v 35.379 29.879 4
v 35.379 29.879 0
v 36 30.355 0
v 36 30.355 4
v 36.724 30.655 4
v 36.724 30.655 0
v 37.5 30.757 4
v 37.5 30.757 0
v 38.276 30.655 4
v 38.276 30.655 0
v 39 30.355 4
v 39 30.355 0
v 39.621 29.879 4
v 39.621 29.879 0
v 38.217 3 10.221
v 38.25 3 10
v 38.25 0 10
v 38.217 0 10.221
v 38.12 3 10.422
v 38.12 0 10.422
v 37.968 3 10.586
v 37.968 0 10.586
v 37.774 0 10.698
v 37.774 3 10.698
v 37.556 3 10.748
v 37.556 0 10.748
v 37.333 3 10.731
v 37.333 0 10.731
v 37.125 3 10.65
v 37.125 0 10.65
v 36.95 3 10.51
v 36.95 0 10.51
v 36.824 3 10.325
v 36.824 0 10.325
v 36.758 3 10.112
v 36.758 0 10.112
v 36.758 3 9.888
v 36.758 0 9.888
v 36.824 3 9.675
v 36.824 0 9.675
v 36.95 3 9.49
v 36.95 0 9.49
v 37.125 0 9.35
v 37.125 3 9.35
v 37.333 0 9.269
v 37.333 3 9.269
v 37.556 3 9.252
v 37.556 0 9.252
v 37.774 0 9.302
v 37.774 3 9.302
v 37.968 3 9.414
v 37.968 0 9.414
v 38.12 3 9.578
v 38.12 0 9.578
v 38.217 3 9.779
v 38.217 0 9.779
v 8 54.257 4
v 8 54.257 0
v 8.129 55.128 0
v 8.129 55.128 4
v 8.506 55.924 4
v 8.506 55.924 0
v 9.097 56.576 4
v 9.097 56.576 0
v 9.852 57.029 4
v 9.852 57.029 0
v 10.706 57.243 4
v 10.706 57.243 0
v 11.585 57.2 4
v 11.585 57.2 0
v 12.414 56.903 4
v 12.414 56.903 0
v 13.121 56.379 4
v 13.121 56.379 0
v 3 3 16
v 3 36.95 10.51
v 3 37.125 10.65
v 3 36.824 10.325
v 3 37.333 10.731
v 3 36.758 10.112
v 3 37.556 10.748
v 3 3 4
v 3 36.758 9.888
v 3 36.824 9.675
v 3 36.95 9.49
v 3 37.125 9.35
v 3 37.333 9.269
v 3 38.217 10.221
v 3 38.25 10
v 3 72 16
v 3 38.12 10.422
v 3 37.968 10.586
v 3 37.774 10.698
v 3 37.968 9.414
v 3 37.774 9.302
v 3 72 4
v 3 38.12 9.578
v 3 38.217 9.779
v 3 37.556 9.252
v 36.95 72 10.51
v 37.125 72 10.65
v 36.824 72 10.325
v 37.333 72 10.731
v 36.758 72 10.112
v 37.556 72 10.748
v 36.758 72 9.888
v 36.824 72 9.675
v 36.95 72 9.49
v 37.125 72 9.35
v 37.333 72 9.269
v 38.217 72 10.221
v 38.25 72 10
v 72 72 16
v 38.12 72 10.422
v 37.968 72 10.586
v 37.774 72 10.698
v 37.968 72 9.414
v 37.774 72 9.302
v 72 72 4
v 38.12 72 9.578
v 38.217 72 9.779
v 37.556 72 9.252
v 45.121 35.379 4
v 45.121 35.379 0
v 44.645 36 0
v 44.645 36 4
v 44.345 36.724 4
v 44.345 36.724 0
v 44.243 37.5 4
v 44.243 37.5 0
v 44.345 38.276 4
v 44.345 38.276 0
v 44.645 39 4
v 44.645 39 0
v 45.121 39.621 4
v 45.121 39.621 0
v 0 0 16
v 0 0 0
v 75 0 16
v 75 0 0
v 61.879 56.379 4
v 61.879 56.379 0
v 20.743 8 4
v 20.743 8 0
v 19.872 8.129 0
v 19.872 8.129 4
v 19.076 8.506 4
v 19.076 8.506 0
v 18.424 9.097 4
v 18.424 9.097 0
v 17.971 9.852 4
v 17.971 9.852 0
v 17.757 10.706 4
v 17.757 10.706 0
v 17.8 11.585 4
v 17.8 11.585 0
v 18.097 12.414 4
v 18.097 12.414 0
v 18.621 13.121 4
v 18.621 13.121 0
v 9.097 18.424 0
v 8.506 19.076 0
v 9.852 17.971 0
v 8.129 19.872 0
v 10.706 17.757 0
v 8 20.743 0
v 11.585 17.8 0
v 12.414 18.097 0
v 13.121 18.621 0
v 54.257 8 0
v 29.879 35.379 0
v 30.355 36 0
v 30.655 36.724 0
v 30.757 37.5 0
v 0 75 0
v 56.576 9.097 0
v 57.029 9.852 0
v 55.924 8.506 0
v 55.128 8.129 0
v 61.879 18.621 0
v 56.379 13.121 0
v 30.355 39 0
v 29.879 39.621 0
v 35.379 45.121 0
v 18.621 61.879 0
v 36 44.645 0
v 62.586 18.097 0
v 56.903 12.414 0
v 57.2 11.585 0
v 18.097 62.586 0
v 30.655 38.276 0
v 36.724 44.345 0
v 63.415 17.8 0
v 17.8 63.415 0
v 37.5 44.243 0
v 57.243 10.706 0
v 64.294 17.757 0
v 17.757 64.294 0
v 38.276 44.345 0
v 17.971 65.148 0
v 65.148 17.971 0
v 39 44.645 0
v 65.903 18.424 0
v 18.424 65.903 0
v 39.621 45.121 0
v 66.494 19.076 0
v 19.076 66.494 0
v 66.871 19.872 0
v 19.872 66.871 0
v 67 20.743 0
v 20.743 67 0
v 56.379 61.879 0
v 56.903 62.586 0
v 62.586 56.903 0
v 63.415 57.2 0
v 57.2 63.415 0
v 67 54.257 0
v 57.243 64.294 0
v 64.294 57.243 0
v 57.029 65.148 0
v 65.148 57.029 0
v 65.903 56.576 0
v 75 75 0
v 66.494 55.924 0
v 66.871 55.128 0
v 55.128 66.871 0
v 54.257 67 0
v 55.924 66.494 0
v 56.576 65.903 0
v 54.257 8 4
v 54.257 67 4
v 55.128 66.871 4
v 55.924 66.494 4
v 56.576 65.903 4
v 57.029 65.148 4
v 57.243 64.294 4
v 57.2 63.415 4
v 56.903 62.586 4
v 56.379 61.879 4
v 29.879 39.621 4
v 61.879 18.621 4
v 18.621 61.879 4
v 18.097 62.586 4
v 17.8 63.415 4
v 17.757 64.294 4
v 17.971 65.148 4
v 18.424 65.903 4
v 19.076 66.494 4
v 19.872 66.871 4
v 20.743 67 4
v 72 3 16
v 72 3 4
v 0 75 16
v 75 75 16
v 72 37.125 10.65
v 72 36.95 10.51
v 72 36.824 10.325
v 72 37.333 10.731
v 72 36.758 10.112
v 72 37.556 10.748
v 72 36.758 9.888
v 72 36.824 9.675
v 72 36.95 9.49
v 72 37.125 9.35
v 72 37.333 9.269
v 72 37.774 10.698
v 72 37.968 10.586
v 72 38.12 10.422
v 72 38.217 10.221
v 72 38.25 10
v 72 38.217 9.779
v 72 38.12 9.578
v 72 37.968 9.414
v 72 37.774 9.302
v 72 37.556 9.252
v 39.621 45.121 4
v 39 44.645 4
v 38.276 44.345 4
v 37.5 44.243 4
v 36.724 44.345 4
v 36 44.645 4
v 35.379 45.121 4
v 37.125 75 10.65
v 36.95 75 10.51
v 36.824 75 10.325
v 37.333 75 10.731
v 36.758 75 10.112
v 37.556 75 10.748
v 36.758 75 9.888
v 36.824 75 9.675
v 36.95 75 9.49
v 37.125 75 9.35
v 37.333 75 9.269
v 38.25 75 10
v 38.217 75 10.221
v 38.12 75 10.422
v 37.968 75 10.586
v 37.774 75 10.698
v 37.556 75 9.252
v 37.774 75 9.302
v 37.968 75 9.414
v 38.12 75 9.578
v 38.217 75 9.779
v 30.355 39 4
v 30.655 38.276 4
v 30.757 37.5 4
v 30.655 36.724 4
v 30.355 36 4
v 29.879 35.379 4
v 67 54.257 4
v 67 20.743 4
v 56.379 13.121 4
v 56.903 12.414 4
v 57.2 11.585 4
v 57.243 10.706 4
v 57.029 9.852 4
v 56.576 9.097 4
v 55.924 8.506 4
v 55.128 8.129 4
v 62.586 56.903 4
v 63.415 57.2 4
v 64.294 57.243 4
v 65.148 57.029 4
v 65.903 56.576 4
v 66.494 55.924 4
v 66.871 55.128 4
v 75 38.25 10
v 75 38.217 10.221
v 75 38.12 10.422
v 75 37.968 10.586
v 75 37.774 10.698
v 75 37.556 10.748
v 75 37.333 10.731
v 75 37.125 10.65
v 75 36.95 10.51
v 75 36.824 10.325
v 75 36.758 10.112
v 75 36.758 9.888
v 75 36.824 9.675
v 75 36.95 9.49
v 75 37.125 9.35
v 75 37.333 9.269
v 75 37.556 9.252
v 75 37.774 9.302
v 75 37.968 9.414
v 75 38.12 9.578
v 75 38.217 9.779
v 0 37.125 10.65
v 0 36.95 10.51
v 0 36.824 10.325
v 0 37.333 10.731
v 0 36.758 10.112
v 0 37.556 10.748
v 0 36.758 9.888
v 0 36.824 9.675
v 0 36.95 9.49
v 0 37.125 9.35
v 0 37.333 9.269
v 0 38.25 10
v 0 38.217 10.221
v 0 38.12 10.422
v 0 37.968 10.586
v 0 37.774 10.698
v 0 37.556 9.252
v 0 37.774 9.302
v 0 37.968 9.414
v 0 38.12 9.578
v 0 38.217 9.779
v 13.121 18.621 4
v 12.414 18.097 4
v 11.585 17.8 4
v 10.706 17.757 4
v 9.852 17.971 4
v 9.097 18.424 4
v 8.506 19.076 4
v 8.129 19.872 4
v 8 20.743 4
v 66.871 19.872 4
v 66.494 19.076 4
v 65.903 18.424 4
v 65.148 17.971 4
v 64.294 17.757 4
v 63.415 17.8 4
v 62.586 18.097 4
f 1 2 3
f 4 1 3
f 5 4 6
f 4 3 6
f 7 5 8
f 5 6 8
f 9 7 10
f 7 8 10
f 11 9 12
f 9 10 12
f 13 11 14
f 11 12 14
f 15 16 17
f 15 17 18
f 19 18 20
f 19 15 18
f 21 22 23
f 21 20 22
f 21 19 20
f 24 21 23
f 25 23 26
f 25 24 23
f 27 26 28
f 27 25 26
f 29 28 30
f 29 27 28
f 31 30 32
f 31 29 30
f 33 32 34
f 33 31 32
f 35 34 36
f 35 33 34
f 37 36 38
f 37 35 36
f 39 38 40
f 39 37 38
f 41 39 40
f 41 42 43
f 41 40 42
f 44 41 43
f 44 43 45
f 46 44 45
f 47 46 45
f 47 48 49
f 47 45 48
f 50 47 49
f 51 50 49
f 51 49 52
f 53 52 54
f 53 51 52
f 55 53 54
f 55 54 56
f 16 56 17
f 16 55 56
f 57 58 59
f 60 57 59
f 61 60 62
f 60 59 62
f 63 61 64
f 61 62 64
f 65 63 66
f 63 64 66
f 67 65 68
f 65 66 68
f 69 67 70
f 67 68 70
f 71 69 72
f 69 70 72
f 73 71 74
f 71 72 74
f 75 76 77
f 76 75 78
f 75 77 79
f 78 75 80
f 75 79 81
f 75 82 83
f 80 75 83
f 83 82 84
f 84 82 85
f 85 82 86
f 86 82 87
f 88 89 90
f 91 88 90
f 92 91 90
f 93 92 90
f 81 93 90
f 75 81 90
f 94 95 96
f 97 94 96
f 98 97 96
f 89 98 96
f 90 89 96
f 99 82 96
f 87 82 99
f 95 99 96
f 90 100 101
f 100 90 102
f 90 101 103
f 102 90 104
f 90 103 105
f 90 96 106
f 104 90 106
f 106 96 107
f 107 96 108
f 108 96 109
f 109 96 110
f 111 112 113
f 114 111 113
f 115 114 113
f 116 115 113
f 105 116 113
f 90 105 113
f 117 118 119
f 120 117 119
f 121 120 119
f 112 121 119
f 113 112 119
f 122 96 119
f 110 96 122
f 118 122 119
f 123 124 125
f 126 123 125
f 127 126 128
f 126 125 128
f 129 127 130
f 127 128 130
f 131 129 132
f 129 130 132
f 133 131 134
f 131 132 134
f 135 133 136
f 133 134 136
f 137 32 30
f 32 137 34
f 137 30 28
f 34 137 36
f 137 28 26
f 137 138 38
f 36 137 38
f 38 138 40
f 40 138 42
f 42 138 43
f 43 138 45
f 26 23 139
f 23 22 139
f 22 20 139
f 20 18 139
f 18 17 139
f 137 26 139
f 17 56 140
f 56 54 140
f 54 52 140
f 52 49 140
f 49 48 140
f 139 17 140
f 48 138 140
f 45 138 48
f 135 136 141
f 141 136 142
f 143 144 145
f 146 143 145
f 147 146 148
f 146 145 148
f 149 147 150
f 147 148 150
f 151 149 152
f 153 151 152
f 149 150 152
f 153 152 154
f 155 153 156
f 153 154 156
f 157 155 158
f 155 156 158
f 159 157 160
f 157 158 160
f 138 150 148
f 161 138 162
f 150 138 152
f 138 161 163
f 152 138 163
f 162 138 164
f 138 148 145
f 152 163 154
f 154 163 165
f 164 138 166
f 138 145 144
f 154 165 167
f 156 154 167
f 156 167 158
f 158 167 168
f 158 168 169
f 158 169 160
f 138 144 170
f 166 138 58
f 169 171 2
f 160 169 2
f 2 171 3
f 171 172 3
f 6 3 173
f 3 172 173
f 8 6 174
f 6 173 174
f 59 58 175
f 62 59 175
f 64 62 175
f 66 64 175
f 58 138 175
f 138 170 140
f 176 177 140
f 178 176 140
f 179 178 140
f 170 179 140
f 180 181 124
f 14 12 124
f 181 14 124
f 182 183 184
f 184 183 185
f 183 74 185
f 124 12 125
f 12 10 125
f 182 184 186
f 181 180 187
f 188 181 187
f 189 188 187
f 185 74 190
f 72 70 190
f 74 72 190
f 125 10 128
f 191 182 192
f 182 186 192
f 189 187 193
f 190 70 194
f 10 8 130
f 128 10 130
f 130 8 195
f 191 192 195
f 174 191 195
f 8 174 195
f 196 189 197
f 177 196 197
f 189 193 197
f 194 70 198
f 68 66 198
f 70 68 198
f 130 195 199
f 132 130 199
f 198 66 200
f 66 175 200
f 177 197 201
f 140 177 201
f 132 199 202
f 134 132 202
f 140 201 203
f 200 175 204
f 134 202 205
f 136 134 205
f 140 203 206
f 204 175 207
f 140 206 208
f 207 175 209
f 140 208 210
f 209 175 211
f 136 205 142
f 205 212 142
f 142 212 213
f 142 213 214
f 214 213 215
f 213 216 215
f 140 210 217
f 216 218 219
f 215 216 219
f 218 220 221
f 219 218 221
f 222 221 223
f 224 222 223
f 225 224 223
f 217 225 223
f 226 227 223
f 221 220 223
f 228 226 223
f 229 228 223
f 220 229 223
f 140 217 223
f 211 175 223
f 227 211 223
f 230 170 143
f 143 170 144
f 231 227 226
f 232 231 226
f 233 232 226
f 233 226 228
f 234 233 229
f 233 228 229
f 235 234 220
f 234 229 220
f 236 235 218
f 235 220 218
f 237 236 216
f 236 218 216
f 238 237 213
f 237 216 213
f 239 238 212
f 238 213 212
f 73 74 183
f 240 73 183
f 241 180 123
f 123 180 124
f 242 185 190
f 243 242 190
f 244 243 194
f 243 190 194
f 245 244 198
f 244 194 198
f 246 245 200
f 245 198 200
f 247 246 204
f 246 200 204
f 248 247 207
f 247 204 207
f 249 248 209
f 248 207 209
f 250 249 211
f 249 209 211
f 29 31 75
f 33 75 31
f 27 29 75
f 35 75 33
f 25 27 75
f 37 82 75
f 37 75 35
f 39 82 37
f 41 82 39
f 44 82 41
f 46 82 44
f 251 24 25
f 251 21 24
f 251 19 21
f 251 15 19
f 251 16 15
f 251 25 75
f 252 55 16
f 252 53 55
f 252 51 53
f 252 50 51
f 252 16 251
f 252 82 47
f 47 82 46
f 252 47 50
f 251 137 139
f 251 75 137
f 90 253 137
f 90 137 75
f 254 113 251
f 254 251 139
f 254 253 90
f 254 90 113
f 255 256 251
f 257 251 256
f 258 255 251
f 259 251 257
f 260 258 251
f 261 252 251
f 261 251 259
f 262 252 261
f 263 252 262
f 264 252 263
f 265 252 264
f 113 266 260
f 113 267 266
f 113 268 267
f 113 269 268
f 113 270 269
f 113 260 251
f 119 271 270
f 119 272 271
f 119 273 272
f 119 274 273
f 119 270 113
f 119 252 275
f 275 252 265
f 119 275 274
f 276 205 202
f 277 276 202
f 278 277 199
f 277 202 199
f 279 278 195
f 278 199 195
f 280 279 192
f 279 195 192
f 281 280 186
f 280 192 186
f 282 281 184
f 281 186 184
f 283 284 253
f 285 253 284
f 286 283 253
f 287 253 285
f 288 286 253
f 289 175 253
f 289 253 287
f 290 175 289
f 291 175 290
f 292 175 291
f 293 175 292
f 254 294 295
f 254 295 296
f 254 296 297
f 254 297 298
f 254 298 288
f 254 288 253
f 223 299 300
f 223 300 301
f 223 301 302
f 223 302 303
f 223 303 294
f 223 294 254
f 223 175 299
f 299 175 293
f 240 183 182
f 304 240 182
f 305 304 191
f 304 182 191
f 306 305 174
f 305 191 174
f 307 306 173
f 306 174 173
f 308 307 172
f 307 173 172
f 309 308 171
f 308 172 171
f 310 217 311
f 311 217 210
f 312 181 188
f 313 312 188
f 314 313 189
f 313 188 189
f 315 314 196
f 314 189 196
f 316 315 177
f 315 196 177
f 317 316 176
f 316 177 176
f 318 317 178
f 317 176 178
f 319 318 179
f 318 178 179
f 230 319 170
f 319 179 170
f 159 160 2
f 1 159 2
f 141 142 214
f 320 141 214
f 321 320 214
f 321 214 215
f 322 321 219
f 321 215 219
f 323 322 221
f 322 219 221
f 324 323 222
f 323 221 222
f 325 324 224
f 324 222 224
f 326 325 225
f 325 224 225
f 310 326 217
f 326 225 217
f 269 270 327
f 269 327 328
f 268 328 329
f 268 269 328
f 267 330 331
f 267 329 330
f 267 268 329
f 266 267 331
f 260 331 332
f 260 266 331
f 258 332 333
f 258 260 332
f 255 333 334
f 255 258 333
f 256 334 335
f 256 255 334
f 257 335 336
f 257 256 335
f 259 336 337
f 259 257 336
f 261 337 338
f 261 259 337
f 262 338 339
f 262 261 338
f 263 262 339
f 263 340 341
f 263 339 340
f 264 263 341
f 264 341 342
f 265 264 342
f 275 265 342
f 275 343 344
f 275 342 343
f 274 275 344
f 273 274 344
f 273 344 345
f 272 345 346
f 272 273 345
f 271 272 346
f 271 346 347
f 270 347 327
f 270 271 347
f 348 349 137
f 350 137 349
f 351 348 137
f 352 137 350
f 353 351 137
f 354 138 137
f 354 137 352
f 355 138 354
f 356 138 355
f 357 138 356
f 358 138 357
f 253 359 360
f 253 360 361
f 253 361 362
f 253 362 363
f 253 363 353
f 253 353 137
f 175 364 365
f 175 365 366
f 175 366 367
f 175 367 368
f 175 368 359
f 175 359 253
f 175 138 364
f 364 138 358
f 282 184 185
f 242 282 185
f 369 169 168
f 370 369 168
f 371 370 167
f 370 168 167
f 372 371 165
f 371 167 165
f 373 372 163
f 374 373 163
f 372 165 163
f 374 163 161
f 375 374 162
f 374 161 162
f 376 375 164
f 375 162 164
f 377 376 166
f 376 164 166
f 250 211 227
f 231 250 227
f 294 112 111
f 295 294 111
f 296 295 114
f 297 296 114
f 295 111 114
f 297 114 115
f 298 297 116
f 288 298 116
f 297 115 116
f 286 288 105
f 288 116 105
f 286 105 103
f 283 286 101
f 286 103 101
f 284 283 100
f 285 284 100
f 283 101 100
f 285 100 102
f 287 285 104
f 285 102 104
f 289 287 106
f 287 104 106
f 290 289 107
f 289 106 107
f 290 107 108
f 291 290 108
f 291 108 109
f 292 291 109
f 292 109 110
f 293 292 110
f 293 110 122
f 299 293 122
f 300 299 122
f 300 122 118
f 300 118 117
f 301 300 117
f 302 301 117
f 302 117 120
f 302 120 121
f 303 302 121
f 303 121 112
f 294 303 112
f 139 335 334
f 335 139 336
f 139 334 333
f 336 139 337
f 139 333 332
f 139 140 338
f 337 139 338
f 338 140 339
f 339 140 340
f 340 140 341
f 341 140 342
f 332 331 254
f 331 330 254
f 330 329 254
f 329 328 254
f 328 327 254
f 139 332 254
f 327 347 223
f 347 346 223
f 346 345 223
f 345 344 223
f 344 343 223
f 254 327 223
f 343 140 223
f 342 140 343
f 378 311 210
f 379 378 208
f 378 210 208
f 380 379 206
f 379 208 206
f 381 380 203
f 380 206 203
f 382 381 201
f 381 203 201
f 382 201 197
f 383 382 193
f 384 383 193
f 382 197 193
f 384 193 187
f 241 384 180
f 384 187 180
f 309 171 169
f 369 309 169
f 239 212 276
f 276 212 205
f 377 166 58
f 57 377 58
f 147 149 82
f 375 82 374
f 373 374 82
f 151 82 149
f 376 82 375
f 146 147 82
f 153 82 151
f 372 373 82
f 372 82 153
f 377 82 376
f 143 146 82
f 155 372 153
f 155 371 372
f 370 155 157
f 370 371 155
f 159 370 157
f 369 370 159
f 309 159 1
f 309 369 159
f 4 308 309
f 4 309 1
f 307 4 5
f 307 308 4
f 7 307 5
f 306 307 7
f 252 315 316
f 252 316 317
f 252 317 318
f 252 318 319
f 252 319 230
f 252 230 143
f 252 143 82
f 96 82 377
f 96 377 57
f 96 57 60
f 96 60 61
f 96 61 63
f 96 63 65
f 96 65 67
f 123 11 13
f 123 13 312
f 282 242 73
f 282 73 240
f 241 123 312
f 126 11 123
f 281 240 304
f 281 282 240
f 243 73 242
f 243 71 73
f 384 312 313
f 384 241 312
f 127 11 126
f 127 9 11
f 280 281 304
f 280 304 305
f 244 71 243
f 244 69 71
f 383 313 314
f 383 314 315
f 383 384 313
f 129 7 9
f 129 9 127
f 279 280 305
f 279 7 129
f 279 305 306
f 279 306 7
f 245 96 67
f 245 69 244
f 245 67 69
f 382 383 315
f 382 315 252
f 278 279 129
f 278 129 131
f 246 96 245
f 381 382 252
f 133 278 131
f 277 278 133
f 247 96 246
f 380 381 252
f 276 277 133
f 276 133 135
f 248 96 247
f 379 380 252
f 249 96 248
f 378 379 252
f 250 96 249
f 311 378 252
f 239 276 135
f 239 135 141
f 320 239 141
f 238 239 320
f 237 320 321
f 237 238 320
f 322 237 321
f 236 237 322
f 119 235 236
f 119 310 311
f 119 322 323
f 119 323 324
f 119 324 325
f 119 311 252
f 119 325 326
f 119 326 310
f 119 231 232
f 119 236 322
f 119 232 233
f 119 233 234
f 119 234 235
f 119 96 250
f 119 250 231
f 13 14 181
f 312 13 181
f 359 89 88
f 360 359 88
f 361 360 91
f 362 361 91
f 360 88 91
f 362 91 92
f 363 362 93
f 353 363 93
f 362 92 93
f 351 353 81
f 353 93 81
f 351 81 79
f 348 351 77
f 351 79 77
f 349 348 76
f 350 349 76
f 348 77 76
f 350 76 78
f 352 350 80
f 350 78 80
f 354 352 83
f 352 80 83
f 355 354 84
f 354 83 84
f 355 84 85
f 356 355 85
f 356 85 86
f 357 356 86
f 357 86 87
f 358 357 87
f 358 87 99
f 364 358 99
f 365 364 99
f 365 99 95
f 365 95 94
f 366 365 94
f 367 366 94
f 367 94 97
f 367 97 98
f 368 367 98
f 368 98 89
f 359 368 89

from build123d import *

# Parameters (mm, degrees)
F0_W          = 75
F0_H          = 75
F1_DEPTH      = 4
F2_W          = 75
F2_H          = 75
F2_W_2        = 69
F2_H_2        = 69
F3_DEPTH      = 12
F5_DEPTH      = 25
F6_R          = 0.75
F7_DEPTH      = 25
F7_DEPTH_BACK = 72.001
F8_R          = 0.75
F9_DEPTH      = 25
F9_DEPTH_BACK = 72.001


with BuildPart() as f1:
    # F0 (on Top) → F1 (new body)
    with BuildSketch(Plane.XY):
        with Locations((37.5, 37.5)):
            Rectangle(F0_W, F0_H)
    extrude(amount=F1_DEPTH)

    # F2 (on face) → F3 (join)
    with BuildSketch(Plane.XY.offset(4)):
        with Locations((37.5, 37.5)):
            Rectangle(F2_W, F2_H)
        with Locations((37.5, 37.5)):
            Rectangle(F2_W_2, F2_H_2, mode=Mode.SUBTRACT)
    extrude(amount=F3_DEPTH)

    # F4 (on face) → F5 (cut)
    with BuildSketch(Plane(origin=(0, 0, 0), x_dir=(1, 0, 0), z_dir=(0, 0, -1))):
        with BuildLine():
            ThreePointArc((13.1213203436, -18.6213203436), (9.8519497029, -17.9710020896), (8, -20.7426406871))
            Line((8, -20.7426406871), (8, -54.2573593129))
            ThreePointArc((8, -54.2573593129), (9.8519497029, -57.0289979104), (13.1213203436, -56.3786796564))
            Line((13.1213203436, -56.3786796564), (29.8786796564, -39.6213203436))
            ThreePointArc((29.8786796564, -39.6213203436), (30.7573593129, -37.5), (29.8786796564, -35.3786796564))
            Line((29.8786796564, -35.3786796564), (13.1213203436, -18.6213203436))
        make_face()
        with BuildLine():
            ThreePointArc((35.3786796564, -29.8786796564), (37.5, -30.7573593129), (39.6213203436, -29.8786796564))
            Line((39.6213203436, -29.8786796564), (56.3786796564, -13.1213203436))
            ThreePointArc((56.3786796564, -13.1213203436), (57.0289979104, -9.8519497029), (54.2573593129, -8))
            Line((54.2573593129, -8), (20.7426406871, -8))
            ThreePointArc((20.7426406871, -8), (17.9710020896, -9.8519497029), (18.6213203436, -13.1213203436))
            Line((18.6213203436, -13.1213203436), (35.3786796564, -29.8786796564))
        make_face()
        with BuildLine():
            Line((67, -54.2573593129), (67, -20.7426406871))
            ThreePointArc((67, -20.7426406871), (65.1480502971, -17.9710020896), (61.8786796564, -18.6213203436))
            Line((61.8786796564, -18.6213203436), (45.1213203436, -35.3786796564))
            ThreePointArc((45.1213203436, -35.3786796564), (44.2426406871, -37.5), (45.1213203436, -39.6213203436))
            Line((45.1213203436, -39.6213203436), (61.8786796564, -56.3786796564))
            ThreePointArc((61.8786796564, -56.3786796564), (65.1480502971, -57.0289979104), (67, -54.2573593129))
        make_face()
        with BuildLine():
            Line((56.3786796564, -61.8786796564), (39.6213203436, -45.1213203436))
            ThreePointArc((39.6213203436, -45.1213203436), (37.5, -44.2426406871), (35.3786796564, -45.1213203436))
            Line((35.3786796564, -45.1213203436), (18.6213203436, -61.8786796564))
            ThreePointArc((18.6213203436, -61.8786796564), (17.9710020896, -65.1480502971), (20.7426406871, -67))
            Line((20.7426406871, -67), (54.2573593129, -67))
            ThreePointArc((54.2573593129, -67), (57.0289979104, -65.1480502971), (56.3786796564, -61.8786796564))
        make_face()
    extrude(amount=-F5_DEPTH, mode=Mode.SUBTRACT)

    # F6 (on face) → F7 (cut, two sides)
    with BuildSketch(Plane.XZ.offset(-72)) as f7_sk:
        with Locations((37.5, 10)):
            Circle(F6_R)
    extrude(amount=-F7_DEPTH, mode=Mode.SUBTRACT)
    extrude(f7_sk.sketch, amount=F7_DEPTH_BACK, mode=Mode.SUBTRACT)

    # F8 (on face) → F9 (cut, two sides)
    with BuildSketch(Plane.YZ.offset(3)) as f9_sk:
        with Locations((37.5, 10)):
            Circle(F8_R)
    extrude(amount=-F9_DEPTH, mode=Mode.SUBTRACT)
    extrude(f9_sk.sketch, amount=F9_DEPTH_BACK, mode=Mode.SUBTRACT)


solid = f1.part
